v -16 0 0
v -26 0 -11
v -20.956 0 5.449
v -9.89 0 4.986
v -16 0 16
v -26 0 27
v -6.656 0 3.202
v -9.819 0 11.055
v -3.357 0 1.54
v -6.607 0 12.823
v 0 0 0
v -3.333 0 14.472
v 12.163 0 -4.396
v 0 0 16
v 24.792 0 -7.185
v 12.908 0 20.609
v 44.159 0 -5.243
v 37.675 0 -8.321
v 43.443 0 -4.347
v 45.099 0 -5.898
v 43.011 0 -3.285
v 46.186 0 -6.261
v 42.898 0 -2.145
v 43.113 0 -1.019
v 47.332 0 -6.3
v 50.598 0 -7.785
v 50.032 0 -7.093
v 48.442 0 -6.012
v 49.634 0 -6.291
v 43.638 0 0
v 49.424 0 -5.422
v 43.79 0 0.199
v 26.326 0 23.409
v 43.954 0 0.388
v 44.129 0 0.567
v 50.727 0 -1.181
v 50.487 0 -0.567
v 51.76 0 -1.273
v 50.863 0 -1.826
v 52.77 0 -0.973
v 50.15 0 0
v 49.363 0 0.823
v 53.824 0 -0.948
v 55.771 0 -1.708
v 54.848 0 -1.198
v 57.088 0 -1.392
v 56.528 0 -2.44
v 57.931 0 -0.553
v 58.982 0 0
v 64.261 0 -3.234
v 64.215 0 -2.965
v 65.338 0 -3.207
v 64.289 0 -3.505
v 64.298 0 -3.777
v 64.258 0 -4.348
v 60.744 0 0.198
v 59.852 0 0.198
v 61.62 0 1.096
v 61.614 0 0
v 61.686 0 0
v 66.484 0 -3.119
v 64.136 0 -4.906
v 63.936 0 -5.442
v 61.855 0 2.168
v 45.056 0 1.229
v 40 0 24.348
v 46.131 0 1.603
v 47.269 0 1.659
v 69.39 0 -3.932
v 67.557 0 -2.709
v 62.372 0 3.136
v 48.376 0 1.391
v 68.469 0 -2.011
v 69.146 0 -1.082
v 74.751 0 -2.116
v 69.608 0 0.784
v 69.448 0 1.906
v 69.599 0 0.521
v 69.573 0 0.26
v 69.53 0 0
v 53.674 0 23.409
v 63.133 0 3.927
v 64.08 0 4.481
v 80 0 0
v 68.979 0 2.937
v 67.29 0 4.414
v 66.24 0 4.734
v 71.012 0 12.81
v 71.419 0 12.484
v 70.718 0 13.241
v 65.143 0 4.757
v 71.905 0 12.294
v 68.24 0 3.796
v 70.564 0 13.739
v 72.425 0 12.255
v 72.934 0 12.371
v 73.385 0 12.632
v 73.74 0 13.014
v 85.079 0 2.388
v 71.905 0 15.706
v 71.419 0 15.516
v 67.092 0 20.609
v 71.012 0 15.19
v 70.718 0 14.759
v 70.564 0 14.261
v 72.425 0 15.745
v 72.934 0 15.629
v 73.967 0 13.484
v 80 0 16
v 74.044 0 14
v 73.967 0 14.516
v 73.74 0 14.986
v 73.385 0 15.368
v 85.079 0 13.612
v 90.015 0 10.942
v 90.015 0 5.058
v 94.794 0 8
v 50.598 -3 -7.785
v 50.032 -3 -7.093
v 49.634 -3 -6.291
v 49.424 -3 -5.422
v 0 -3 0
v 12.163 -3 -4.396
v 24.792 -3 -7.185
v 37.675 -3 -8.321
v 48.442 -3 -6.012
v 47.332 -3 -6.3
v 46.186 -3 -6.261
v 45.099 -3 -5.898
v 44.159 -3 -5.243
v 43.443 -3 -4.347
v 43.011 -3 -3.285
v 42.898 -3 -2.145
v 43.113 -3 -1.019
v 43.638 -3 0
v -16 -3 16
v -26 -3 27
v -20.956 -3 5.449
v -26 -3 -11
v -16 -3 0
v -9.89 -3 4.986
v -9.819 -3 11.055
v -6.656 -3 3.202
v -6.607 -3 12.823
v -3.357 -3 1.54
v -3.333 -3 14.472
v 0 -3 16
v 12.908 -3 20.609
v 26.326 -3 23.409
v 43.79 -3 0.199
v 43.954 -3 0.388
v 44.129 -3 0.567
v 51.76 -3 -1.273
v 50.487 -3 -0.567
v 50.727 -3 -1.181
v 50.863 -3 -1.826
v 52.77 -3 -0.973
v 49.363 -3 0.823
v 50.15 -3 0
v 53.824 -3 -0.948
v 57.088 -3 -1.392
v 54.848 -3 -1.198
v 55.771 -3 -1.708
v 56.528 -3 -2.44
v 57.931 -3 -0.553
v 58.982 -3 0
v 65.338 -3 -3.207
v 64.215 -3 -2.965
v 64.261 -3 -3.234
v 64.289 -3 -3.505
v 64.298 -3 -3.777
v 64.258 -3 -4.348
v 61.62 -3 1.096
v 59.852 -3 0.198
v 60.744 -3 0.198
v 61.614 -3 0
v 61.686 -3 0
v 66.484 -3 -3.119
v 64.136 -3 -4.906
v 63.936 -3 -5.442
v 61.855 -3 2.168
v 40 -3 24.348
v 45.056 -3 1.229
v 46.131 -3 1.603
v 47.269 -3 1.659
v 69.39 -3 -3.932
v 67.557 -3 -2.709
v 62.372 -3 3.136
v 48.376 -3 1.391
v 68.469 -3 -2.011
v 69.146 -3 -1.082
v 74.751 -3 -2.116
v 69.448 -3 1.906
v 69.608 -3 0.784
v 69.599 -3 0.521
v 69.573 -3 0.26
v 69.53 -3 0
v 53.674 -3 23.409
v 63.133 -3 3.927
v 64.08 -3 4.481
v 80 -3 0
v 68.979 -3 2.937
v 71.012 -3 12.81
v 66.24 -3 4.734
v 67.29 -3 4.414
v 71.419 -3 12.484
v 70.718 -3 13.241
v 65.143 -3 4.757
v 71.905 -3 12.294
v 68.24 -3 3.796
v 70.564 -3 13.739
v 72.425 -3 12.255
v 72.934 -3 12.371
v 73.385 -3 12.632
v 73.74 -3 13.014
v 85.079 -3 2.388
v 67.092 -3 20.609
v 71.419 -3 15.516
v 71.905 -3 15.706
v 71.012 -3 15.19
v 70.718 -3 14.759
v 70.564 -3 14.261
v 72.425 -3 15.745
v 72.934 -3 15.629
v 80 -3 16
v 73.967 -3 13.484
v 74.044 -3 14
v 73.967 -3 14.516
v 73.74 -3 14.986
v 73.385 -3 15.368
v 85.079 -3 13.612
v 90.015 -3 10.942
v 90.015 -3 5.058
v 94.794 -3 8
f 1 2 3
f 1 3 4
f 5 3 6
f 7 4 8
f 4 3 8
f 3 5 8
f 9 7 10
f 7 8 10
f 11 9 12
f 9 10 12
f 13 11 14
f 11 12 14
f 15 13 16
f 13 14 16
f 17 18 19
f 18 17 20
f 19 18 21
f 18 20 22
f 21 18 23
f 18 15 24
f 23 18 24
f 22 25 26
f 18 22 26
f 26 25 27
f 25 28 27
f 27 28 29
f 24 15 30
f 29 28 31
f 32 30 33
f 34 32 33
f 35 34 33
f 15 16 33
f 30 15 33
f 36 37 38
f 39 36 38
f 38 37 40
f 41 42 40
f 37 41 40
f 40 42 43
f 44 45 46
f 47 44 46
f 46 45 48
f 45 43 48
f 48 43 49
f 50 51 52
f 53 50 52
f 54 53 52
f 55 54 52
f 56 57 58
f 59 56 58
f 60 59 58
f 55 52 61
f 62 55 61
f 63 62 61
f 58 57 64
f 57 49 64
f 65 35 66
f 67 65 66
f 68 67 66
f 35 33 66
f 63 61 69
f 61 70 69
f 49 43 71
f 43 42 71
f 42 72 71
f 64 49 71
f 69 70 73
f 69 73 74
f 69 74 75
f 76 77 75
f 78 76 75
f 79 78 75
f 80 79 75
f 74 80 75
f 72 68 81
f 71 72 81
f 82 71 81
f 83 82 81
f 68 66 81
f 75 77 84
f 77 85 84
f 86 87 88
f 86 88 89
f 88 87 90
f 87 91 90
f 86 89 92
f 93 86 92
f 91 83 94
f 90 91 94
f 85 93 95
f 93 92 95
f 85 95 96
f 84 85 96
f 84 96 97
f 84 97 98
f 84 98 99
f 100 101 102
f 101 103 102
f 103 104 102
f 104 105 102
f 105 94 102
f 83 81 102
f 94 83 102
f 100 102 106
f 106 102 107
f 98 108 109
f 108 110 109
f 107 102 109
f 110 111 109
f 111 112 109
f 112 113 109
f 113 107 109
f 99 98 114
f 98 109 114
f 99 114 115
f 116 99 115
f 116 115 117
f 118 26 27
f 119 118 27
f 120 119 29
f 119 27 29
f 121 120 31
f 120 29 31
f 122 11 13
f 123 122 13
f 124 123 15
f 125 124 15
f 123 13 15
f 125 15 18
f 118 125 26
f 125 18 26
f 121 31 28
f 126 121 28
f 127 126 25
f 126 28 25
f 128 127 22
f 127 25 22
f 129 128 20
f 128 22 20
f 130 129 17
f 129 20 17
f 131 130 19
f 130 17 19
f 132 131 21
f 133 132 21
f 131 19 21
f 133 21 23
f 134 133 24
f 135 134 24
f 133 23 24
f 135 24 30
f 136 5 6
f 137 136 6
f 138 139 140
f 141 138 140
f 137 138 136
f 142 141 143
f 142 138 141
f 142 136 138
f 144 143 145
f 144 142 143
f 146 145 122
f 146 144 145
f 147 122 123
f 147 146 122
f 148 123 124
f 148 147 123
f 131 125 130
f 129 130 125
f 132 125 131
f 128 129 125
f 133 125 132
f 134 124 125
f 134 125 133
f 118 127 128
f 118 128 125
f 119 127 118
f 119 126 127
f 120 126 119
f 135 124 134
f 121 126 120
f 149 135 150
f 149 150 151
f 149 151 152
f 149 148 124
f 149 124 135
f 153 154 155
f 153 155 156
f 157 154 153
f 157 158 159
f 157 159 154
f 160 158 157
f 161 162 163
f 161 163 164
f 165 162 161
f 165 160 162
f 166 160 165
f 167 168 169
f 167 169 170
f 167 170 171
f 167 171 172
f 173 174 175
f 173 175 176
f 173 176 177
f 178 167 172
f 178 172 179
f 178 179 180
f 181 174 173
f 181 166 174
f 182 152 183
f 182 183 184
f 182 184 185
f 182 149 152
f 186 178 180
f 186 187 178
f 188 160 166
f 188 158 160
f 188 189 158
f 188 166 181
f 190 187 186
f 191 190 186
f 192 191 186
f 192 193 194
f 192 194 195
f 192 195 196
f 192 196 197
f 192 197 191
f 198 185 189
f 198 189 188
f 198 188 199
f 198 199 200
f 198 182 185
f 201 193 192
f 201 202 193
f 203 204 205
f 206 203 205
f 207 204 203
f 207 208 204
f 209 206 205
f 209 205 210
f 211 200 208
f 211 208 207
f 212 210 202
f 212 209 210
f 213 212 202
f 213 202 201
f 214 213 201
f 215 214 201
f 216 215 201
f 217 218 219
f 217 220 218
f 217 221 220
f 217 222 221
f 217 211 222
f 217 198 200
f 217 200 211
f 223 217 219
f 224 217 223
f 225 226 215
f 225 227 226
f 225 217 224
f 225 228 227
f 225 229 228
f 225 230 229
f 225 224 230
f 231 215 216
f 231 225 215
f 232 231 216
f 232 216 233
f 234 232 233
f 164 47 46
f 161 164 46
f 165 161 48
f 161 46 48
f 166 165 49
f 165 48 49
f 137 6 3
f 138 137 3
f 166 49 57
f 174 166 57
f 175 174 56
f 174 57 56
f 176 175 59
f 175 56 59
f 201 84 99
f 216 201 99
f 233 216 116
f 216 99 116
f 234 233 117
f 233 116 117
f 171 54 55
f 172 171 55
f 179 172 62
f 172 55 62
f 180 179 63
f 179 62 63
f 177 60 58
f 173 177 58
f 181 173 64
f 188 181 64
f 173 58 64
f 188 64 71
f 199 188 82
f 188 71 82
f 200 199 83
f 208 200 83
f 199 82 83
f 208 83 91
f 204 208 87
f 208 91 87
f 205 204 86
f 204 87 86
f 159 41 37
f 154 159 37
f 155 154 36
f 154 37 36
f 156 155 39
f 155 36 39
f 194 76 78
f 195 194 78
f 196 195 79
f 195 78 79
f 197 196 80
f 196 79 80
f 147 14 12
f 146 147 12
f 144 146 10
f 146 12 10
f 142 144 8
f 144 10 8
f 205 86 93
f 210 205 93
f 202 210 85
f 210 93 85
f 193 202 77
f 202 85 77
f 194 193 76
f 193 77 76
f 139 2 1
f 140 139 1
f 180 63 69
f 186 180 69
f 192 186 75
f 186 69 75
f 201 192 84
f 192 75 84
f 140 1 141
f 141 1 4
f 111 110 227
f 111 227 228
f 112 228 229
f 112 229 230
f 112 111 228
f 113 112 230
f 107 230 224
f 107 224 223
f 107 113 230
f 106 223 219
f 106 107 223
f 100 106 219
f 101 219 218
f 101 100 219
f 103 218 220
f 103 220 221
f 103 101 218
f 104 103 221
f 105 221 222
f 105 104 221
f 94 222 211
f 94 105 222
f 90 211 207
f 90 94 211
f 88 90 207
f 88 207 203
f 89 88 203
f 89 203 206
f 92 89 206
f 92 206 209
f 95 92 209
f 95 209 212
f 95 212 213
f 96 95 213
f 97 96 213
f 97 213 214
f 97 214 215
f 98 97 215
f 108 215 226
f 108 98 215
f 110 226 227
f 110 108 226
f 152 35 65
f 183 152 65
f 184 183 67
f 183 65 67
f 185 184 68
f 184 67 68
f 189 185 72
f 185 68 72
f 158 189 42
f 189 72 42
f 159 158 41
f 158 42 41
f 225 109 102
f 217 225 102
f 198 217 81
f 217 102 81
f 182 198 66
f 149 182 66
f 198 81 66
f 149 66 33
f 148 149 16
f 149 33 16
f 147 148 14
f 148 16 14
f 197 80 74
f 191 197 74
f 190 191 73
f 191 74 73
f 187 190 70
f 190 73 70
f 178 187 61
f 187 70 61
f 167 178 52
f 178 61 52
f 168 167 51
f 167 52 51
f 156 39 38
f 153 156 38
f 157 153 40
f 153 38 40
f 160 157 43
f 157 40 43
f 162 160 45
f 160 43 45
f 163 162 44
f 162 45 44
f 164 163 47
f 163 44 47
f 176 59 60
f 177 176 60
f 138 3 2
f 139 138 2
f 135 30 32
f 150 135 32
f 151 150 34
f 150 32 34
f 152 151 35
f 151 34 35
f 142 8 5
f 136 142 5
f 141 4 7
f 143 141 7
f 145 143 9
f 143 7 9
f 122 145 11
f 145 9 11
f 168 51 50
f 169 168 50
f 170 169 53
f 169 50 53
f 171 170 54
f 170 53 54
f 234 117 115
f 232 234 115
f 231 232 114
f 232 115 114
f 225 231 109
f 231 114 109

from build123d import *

# Parameters (mm, degrees)
F0_R     = 1.75
F1_DEPTH = 3


# Not quite as in the source:
# - a feature names something its author has since deleted; it is built from what else it names


with BuildPart() as f1:
    # F0 (on Front) → F1 (new body)
    with BuildSketch(Plane.XZ):
        with BuildLine():
            Line((0, 16), (0, 0))
            Line((0, 0), (43.6382221521, 0))
            ThreePointArc((43.6382221521, 0), (43.870370626, 0.294923121), (44.1291400161, 0.5667888304))
            ThreePointArc((44.1291400161, 0.5667888304), (41.7991534918, 8.3522131948), (44.5474305371, 16))
            Line((44.5474305371, 16), (0, 16))
        make_face()
        with BuildLine():
            ThreePointArc((-9.8901239272, 4.9856294086), (-5.0141391128, 2.3557845503), (0, 0))
            Line((0, 0), (0, 16))
            ThreePointArc((0, 16), (-4.9775998147, 13.6626256025), (-9.8191881817, 11.0551668638))
            ThreePointArc((-9.8191881817, 11.0551668638), (-12.3290859965, 9.5638999576), (-14.7943813031, 8))
            ThreePointArc((-14.7943813031, 8), (-12.3639476772, 6.4575177277), (-9.8901239272, 4.9856294086))
        make_face()
        with BuildLine():
            Line((43.6382221521, 0), (0, 0))
            ThreePointArc((0, 0), (24.7921839108, -7.1853331257), (50.5976363139, -7.7853510181))
            ThreePointArc((50.5976363139, -7.7853510181), (49.8103733831, -6.7032232406), (49.4240926583, -5.4219853039))
            ThreePointArc((49.4240926583, -5.4219853039), (44.1587611024, -5.2426073702), (43.6382221521, 0))
        make_face()
        with BuildLine():
            ThreePointArc((80, 16), (40, 24.3484861009), (0, 16))
            Line((0, 16), (44.5474305371, 16))
            ThreePointArc((44.5474305371, 16), (54.7943813031, 21), (65.041332069, 16))
            Line((65.041332069, 16), (80, 16))
        make_face()
        with BuildLine():
            Line((-16, -0.0001621457), (-9.8901239272, 4.9856294086))
            ThreePointArc((-9.8901239272, 4.9856294086), (-12.3639476772, 6.4575177277), (-14.7943813031, 8))
            ThreePointArc((-14.7943813031, 8), (-12.3290859965, 9.5638999576), (-9.8191881817, 11.0551668638))
            Line((-9.8191881817, 11.0551668638), (-16, 16))
            Line((-16, 16), (-16, -0.0001621457))
        make_face()
        with BuildLine():
            ThreePointArc((44.5474305371, 16), (41.7991534918, 8.3522131948), (44.1291400161, 0.5667888304))
            ThreePointArc((44.1291400161, 0.5667888304), (47.2688331903, 1.6585032514), (50.1496109619, 0))
            Line((50.1496109619, 0), (58.9824606658, 0))
            ThreePointArc((58.9824606658, 0), (60.2984076368, 0.2226618407), (61.6143546079, 0))
            Line((61.6143546079, 0), (61.6856141113, 0))
            ThreePointArc((61.6856141113, 0), (63.1331562403, 3.9268000172), (67.289866632, 4.41351894))
            ThreePointArc((67.289866632, 4.41351894), (67.6676347628, 6.1891037132), (67.7943813031, 8))
            ThreePointArc((67.7943813031, 8), (67.0868659981, 12.2302269468), (65.041332069, 16))
            Line((65.041332069, 16), (44.5474305371, 16))
        make_face()
        with BuildLine():
            ThreePointArc((65.041332069, 16), (54.7943813031, 21), (44.5474305371, 16))
            Line((44.5474305371, 16), (65.041332069, 16))
        make_face()
        with BuildLine():
            Line((80, 0), (80, 16))
            Line((80, 16), (65.041332069, 16))
            ThreePointArc((65.041332069, 16), (67.0868659981, 12.2302269468), (67.7943813031, 8))
            ThreePointArc((67.7943813031, 8), (67.6676347628, 6.1891037132), (67.289866632, 4.41351894))
            ThreePointArc((67.289866632, 4.41351894), (68.9789922296, 2.9374861341), (69.6079694957, 0.7843011149))
            ThreePointArc((69.6079694957, 0.7843011149), (69.5885110127, 0.3902335683), (69.53032488, 0))
            Line((69.53032488, 0), (80, 0))
        make_face()
        with Locations((72.2943813031, 14)):
            Circle(F0_R, mode=Mode.SUBTRACT)
        with BuildLine():
            ThreePointArc((94.7943813031, 8), (87.5656775591, 12.3115824444), (80, 16))
            Line((80, 16), (80, 0))
            ThreePointArc((80, 0), (87.5656775591, 3.6884175556), (94.7943813031, 8))
        make_face()
        Polygon((-26, -11.0001621457), (-16, -0.0001621457), (-16, 16), (-26, 27), (-20.9564695358, 5.4488921514), align=None)
        with BuildLine():
            Line((58.9824606658, 0), (50.1496109619, 0))
            ThreePointArc((50.1496109619, 0), (50.6198306879, -0.8687025049), (50.862827722, -1.8261486257))
            ThreePointArc((50.862827722, -1.8261486257), (53.8241968939, -0.9475550969), (56.5284231629, -2.4404697788))
            ThreePointArc((56.5284231629, -2.4404697788), (57.4778318355, -0.941081445), (58.9824606658, 0))
        make_face()
        with BuildLine():
            ThreePointArc((63.935726955, -5.4416422713), (72.0834406348, -3.0620164808), (80, 0))
            Line((80, 0), (69.53032488, 0))
            ThreePointArc((69.53032488, 0), (67.5568042663, -2.7088411721), (64.215128062, -2.965364569))
            ThreePointArc((64.215128062, -2.965364569), (64.2775332757, -3.3692215709), (64.2984076368, -3.7773381593))
            ThreePointArc((64.2984076368, -3.7773381593), (64.2066858557, -4.6290196511), (63.935726955, -5.4416422713))
        make_face()
    extrude(amount=F1_DEPTH)


solid = f1.part
